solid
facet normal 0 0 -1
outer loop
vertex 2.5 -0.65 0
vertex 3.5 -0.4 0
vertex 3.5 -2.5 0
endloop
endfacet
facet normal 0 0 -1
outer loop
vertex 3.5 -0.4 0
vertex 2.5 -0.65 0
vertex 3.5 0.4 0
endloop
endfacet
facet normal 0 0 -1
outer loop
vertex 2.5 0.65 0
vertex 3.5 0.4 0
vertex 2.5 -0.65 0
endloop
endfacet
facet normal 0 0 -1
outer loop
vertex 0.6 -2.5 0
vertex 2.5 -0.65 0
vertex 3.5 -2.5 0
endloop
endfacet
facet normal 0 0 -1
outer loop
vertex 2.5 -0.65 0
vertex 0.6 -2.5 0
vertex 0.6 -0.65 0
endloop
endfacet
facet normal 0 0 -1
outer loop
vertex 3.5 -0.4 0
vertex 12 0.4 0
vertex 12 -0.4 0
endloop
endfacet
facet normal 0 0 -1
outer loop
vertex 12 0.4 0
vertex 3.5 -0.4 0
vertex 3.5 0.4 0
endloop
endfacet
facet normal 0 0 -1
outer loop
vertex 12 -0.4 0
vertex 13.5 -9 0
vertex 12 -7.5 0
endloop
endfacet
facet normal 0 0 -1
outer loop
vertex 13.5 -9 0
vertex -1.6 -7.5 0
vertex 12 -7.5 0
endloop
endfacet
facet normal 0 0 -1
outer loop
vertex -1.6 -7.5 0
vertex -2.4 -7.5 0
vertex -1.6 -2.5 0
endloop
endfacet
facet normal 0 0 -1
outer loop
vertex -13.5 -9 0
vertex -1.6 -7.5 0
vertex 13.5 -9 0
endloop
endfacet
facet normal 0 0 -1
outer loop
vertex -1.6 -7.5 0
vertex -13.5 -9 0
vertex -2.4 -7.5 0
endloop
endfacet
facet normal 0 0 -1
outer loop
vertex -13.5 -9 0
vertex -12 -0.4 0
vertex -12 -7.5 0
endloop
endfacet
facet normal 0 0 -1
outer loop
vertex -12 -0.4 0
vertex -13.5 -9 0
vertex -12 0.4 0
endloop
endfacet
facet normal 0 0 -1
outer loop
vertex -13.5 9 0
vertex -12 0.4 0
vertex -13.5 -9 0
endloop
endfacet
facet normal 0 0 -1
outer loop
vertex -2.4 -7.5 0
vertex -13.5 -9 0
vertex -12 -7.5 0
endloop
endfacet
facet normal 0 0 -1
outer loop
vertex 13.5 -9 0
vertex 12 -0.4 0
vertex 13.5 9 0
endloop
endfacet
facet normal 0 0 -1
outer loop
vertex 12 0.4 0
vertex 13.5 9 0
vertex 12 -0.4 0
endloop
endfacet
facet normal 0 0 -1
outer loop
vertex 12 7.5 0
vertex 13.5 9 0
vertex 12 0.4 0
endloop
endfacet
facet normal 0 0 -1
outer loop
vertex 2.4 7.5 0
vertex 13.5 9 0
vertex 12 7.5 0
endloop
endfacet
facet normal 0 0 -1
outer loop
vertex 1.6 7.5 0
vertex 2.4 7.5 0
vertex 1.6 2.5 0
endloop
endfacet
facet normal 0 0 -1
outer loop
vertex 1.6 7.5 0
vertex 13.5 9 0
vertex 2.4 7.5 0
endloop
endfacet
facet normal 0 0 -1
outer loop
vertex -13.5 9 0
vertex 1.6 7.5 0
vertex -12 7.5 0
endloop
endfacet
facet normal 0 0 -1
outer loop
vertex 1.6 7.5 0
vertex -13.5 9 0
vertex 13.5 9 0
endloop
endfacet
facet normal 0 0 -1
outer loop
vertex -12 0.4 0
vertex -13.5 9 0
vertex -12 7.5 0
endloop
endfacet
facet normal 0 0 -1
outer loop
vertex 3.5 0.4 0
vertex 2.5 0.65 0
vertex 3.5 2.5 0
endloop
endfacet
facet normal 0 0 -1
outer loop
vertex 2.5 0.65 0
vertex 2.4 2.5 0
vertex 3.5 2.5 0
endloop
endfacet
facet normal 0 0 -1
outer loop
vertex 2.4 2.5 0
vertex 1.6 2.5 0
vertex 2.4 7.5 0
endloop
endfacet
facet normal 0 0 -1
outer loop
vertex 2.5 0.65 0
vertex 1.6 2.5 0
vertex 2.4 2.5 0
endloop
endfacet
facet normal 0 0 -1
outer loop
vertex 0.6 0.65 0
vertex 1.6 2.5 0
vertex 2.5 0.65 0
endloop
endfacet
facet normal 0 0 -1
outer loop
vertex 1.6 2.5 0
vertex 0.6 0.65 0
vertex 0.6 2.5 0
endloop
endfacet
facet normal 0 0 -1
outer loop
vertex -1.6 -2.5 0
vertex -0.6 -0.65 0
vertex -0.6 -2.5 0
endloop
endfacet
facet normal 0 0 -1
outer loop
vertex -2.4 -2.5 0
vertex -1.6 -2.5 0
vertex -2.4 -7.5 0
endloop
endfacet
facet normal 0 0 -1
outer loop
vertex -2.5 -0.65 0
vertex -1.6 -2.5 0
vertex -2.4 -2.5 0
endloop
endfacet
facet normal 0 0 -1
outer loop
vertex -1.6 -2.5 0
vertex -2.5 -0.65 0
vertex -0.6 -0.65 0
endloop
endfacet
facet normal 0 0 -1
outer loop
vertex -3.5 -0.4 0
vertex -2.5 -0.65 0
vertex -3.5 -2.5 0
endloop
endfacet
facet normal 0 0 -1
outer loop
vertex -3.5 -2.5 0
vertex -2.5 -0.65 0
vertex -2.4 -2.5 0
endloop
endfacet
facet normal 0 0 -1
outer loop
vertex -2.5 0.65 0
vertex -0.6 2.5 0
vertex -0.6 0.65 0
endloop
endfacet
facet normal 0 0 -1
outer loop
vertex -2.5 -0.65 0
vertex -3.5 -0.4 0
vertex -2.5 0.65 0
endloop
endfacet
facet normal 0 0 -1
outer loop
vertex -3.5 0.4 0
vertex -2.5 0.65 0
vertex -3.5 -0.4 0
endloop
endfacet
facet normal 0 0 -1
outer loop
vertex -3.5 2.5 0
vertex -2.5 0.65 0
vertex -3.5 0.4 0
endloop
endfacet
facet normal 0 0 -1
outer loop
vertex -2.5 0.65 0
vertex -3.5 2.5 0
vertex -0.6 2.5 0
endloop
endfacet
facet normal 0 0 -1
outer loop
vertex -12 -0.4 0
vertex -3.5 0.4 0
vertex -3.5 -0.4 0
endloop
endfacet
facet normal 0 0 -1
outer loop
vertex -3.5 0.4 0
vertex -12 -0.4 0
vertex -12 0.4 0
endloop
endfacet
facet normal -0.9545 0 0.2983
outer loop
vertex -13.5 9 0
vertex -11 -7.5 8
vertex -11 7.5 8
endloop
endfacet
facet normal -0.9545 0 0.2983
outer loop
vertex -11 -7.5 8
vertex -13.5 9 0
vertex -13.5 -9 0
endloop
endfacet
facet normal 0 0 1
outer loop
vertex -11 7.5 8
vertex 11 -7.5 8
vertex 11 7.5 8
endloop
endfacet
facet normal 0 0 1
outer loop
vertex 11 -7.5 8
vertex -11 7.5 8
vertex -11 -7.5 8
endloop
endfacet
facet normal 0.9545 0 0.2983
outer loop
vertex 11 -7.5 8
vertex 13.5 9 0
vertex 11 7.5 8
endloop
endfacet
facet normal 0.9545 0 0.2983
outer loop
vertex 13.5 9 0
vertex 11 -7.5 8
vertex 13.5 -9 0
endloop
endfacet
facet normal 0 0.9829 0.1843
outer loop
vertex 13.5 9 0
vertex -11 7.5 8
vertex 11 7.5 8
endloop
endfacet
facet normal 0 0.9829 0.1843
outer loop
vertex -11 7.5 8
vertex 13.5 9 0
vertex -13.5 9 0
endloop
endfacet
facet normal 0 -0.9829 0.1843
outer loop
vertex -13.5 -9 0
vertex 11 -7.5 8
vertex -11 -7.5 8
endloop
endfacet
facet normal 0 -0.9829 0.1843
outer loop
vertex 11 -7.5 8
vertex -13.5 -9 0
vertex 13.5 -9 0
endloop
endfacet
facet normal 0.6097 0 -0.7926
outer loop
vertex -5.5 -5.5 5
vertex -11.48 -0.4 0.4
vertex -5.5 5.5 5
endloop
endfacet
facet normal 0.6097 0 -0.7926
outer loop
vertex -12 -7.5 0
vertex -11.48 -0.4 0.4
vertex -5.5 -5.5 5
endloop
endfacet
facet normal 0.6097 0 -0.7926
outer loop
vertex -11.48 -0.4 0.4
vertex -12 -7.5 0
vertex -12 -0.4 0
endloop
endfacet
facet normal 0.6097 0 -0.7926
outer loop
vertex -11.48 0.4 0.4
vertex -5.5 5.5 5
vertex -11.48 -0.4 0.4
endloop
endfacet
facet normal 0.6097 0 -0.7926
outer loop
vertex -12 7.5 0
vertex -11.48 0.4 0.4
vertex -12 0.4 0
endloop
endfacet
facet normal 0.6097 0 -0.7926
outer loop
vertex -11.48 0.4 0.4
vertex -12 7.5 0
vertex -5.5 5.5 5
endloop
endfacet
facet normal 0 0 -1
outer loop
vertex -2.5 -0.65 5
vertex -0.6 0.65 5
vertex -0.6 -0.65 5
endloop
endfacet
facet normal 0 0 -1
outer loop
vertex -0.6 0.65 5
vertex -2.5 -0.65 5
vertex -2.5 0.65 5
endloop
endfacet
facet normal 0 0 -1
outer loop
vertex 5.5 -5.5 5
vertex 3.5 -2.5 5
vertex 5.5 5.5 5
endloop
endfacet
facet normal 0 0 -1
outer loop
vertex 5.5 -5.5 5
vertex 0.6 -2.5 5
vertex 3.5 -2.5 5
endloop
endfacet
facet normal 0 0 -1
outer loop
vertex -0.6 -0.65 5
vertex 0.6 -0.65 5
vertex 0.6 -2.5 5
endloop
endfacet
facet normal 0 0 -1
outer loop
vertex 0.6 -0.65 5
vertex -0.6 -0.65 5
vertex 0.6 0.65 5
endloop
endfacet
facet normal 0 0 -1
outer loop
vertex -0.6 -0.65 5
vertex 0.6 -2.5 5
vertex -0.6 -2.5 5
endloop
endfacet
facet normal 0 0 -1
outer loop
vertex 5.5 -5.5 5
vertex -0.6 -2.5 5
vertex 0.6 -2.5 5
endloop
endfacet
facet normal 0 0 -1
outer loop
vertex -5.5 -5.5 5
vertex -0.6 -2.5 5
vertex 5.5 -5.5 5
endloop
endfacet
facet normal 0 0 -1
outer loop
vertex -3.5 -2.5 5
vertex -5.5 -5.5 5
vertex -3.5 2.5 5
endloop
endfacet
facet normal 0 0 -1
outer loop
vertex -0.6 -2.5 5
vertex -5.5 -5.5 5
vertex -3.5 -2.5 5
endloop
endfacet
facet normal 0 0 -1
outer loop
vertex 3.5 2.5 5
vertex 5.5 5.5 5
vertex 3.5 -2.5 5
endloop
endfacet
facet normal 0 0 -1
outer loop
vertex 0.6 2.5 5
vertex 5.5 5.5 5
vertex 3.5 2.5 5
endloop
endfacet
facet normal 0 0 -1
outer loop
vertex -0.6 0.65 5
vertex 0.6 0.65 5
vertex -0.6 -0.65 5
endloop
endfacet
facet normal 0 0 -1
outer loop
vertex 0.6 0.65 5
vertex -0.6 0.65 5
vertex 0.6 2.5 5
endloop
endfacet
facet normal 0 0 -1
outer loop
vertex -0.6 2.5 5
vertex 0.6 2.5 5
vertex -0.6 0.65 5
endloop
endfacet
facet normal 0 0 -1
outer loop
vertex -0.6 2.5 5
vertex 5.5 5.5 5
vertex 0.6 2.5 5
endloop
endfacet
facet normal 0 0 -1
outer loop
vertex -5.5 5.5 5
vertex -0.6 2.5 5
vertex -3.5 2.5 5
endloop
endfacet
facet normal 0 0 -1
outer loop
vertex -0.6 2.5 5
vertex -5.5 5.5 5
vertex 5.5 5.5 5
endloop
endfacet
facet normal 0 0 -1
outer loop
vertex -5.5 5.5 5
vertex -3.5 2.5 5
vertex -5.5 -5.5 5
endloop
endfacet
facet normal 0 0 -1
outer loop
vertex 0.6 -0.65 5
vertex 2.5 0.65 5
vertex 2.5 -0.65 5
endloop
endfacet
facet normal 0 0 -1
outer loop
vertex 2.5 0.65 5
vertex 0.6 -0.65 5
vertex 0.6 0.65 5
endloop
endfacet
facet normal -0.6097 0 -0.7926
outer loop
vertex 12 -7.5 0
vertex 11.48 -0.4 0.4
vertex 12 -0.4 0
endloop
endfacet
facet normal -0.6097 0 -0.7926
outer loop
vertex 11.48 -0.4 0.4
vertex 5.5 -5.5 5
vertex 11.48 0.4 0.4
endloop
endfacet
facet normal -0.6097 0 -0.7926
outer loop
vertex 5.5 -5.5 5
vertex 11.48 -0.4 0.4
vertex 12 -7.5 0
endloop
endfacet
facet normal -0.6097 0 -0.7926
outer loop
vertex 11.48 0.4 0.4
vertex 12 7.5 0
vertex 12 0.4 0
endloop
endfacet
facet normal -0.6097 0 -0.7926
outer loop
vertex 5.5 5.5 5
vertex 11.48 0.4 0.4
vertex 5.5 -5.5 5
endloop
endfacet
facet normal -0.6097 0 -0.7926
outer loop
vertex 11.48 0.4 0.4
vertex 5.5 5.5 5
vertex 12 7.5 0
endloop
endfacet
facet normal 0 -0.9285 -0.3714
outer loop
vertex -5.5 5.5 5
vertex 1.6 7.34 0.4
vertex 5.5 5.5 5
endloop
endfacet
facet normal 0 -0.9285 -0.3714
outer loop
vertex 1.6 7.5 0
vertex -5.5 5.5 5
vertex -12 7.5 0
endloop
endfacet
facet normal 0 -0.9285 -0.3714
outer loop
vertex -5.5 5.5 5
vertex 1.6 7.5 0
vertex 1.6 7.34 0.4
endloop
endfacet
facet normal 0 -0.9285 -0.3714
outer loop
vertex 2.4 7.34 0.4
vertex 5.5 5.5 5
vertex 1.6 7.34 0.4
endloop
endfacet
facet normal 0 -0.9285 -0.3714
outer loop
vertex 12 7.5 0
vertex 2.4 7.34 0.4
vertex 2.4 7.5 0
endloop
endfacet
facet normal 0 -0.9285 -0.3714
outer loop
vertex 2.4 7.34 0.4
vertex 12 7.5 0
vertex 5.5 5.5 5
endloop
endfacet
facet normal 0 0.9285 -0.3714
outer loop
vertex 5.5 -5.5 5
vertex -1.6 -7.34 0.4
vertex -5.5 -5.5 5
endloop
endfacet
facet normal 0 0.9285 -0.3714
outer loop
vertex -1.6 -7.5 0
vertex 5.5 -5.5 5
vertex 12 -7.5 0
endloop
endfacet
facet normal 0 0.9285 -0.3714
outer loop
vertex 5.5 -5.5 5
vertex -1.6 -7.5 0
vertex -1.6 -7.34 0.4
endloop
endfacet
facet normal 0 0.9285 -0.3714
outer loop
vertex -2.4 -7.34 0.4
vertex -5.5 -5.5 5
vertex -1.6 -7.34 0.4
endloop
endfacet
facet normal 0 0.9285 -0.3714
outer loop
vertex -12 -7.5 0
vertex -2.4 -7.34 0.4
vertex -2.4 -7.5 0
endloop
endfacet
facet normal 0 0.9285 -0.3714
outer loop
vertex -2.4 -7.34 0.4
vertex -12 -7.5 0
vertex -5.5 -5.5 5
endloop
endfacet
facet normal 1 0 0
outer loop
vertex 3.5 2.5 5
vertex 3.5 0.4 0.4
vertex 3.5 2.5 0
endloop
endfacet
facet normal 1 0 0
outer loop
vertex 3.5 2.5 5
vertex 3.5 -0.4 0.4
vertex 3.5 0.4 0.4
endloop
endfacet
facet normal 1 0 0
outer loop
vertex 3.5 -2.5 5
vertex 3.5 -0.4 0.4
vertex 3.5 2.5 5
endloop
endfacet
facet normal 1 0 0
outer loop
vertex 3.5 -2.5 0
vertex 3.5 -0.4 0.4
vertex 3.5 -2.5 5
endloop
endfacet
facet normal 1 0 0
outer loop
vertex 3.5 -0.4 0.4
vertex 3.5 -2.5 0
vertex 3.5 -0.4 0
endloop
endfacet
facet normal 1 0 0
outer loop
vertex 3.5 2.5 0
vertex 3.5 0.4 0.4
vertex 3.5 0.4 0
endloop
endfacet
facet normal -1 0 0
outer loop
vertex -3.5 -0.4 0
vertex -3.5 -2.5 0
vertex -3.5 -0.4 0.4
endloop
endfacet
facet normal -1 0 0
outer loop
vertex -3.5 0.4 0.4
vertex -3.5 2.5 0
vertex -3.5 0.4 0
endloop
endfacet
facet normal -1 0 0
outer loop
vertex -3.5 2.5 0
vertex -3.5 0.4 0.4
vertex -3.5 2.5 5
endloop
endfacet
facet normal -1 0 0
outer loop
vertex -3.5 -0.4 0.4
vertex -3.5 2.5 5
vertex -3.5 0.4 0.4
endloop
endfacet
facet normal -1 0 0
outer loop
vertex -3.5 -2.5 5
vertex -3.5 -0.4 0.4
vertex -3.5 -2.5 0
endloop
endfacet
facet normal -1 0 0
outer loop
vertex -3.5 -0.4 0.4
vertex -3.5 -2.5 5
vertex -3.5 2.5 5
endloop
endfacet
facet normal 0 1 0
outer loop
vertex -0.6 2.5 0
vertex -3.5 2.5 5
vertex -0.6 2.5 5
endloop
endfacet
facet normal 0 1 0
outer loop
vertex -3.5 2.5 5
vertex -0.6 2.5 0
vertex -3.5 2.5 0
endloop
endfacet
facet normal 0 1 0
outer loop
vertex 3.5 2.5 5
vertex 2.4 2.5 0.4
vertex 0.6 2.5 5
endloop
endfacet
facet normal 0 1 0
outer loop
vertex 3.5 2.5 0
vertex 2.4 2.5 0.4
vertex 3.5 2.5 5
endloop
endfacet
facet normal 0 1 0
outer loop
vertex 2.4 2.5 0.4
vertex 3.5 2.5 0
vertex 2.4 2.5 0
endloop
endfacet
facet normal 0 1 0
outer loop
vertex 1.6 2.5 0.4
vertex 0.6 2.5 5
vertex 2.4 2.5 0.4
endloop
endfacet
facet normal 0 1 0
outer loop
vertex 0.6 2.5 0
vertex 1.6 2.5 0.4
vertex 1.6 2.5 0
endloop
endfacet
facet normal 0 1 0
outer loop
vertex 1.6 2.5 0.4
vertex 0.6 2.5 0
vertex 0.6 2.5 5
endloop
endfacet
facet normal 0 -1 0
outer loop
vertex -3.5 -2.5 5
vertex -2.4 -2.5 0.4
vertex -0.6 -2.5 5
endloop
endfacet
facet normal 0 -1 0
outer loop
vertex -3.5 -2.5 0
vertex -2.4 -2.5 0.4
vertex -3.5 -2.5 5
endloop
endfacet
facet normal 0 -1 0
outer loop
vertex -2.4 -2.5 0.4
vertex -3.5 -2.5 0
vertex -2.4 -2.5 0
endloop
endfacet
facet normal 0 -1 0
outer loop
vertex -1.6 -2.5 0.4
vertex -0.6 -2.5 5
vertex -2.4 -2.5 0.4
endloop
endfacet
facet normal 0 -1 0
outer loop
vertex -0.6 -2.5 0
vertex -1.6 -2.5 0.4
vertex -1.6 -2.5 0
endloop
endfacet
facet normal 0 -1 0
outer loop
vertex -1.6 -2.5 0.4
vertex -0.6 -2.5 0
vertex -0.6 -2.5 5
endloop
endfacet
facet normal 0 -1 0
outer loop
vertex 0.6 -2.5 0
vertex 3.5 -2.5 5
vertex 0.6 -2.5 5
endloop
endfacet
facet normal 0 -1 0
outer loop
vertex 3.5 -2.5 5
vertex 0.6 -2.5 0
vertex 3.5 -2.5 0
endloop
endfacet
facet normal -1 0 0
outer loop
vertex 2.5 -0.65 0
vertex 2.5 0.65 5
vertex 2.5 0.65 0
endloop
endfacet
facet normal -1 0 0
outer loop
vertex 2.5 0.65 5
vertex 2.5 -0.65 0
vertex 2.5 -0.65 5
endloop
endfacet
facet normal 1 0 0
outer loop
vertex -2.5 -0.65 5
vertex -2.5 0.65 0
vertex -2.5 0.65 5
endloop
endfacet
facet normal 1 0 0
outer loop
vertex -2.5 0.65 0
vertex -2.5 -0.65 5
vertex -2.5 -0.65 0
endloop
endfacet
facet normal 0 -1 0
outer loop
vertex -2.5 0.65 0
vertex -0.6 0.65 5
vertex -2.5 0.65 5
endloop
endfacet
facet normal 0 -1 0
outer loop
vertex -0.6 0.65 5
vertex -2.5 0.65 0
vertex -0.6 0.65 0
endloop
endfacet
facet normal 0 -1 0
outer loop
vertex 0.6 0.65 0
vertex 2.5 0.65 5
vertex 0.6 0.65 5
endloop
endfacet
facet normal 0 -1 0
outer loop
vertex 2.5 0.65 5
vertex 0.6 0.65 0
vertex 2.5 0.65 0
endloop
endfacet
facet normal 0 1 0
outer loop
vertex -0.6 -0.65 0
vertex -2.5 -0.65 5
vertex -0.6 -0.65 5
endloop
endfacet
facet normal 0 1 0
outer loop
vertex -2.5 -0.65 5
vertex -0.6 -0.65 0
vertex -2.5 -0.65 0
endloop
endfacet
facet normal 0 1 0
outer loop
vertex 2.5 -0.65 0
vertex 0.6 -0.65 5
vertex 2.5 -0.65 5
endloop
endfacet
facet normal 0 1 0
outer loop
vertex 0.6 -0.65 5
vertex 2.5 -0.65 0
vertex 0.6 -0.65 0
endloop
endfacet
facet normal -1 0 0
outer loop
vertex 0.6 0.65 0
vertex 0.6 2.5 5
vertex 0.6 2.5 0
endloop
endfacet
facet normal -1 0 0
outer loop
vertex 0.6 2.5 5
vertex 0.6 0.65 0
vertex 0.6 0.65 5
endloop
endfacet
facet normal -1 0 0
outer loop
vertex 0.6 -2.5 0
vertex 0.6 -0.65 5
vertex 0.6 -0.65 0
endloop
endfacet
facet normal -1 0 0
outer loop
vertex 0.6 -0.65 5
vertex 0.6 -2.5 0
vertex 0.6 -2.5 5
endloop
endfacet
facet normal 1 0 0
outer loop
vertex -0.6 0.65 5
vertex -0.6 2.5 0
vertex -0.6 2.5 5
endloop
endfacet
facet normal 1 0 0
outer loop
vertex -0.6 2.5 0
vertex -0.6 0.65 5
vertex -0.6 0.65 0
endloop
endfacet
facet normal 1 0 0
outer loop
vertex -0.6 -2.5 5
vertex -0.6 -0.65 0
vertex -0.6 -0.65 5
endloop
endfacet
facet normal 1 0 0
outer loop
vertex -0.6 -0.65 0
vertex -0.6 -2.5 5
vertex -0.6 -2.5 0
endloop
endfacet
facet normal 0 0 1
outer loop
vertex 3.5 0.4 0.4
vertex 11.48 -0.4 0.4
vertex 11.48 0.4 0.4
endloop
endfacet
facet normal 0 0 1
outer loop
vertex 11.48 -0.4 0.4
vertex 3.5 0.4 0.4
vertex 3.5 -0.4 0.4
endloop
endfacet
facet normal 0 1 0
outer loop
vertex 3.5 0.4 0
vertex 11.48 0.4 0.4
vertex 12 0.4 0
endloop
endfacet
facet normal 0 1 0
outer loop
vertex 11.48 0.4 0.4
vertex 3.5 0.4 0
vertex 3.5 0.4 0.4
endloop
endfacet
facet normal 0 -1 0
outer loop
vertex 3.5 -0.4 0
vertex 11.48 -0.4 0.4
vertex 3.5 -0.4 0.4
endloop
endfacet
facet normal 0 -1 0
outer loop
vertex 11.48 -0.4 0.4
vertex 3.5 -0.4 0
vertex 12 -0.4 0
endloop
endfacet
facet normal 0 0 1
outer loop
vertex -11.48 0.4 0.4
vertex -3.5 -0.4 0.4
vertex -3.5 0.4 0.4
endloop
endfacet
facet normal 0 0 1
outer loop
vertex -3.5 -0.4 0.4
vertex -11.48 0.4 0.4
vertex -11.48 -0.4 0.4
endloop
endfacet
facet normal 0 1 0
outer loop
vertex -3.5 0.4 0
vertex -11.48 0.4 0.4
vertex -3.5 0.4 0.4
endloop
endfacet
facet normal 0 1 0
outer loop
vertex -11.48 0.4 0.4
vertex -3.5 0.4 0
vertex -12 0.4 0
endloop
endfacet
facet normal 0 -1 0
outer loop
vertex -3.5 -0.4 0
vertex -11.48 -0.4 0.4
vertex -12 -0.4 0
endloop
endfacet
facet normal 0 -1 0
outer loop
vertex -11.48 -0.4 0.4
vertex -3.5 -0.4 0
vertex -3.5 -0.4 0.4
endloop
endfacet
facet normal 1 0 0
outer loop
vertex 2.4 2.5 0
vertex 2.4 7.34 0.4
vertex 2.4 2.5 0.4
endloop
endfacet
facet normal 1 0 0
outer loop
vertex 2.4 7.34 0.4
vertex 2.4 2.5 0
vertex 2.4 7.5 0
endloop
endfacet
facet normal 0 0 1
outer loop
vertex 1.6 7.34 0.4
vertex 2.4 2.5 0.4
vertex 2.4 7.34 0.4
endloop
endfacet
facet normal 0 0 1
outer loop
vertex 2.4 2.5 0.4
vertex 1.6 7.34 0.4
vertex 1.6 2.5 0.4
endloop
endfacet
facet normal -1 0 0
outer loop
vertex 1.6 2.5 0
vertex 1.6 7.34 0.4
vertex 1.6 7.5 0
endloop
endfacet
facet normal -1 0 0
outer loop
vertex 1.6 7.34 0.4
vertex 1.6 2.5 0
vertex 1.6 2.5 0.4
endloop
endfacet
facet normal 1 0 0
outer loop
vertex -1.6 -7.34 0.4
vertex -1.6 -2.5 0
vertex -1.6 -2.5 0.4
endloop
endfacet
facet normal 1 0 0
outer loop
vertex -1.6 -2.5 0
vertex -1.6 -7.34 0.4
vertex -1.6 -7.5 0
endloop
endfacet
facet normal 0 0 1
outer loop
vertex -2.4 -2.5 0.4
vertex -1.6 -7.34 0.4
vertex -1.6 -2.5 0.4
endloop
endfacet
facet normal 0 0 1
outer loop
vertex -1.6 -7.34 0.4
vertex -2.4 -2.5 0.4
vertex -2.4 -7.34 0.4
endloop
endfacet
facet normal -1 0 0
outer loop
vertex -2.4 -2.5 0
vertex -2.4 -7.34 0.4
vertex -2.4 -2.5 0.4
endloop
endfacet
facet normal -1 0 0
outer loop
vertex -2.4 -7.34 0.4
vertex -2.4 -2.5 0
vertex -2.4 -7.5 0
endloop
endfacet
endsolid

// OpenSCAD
key_height = 8;

bottom_x_size = 27;
bottom_y_size = 18;

top_x_size = 22;
top_y_size = 15;

union() {
  difference() {
    linear_extrude(height = key_height, scale = [top_x_size / bottom_x_size, top_y_size / bottom_y_size]) {
      square(size=[bottom_x_size, bottom_y_size], center=true);
    }
    linear_extrude(height = 5, scale = [11/(bottom_x_size-3), 11/(bottom_y_size-3)]) {
      square(size=[bottom_x_size-3, bottom_y_size-3], center=true);
    }
  }
  translate([0, 0, 3]) {
    difference() {
      cube([7, 5, 6], center=true);
      cube([5, 1.3, 12], center=true);
      cube([1.2, 6, 12], center=true);
    }
  }
  translate([8, 0, 0.2]) cube([(27-6)/2, 0.8, 0.4], center=true);
  translate([-8, 0, 0.2]) cube([(27-6)/2, 0.8, 0.4], center=true);
  translate([2, (18-7)/2, 0.2]) cube([0.8, (18-5)/2, 0.4], center=true);
  translate([-2, -(18-7)/2, 0.2]) cube([0.8, (18-5)/2, 0.4], center=true);
}
